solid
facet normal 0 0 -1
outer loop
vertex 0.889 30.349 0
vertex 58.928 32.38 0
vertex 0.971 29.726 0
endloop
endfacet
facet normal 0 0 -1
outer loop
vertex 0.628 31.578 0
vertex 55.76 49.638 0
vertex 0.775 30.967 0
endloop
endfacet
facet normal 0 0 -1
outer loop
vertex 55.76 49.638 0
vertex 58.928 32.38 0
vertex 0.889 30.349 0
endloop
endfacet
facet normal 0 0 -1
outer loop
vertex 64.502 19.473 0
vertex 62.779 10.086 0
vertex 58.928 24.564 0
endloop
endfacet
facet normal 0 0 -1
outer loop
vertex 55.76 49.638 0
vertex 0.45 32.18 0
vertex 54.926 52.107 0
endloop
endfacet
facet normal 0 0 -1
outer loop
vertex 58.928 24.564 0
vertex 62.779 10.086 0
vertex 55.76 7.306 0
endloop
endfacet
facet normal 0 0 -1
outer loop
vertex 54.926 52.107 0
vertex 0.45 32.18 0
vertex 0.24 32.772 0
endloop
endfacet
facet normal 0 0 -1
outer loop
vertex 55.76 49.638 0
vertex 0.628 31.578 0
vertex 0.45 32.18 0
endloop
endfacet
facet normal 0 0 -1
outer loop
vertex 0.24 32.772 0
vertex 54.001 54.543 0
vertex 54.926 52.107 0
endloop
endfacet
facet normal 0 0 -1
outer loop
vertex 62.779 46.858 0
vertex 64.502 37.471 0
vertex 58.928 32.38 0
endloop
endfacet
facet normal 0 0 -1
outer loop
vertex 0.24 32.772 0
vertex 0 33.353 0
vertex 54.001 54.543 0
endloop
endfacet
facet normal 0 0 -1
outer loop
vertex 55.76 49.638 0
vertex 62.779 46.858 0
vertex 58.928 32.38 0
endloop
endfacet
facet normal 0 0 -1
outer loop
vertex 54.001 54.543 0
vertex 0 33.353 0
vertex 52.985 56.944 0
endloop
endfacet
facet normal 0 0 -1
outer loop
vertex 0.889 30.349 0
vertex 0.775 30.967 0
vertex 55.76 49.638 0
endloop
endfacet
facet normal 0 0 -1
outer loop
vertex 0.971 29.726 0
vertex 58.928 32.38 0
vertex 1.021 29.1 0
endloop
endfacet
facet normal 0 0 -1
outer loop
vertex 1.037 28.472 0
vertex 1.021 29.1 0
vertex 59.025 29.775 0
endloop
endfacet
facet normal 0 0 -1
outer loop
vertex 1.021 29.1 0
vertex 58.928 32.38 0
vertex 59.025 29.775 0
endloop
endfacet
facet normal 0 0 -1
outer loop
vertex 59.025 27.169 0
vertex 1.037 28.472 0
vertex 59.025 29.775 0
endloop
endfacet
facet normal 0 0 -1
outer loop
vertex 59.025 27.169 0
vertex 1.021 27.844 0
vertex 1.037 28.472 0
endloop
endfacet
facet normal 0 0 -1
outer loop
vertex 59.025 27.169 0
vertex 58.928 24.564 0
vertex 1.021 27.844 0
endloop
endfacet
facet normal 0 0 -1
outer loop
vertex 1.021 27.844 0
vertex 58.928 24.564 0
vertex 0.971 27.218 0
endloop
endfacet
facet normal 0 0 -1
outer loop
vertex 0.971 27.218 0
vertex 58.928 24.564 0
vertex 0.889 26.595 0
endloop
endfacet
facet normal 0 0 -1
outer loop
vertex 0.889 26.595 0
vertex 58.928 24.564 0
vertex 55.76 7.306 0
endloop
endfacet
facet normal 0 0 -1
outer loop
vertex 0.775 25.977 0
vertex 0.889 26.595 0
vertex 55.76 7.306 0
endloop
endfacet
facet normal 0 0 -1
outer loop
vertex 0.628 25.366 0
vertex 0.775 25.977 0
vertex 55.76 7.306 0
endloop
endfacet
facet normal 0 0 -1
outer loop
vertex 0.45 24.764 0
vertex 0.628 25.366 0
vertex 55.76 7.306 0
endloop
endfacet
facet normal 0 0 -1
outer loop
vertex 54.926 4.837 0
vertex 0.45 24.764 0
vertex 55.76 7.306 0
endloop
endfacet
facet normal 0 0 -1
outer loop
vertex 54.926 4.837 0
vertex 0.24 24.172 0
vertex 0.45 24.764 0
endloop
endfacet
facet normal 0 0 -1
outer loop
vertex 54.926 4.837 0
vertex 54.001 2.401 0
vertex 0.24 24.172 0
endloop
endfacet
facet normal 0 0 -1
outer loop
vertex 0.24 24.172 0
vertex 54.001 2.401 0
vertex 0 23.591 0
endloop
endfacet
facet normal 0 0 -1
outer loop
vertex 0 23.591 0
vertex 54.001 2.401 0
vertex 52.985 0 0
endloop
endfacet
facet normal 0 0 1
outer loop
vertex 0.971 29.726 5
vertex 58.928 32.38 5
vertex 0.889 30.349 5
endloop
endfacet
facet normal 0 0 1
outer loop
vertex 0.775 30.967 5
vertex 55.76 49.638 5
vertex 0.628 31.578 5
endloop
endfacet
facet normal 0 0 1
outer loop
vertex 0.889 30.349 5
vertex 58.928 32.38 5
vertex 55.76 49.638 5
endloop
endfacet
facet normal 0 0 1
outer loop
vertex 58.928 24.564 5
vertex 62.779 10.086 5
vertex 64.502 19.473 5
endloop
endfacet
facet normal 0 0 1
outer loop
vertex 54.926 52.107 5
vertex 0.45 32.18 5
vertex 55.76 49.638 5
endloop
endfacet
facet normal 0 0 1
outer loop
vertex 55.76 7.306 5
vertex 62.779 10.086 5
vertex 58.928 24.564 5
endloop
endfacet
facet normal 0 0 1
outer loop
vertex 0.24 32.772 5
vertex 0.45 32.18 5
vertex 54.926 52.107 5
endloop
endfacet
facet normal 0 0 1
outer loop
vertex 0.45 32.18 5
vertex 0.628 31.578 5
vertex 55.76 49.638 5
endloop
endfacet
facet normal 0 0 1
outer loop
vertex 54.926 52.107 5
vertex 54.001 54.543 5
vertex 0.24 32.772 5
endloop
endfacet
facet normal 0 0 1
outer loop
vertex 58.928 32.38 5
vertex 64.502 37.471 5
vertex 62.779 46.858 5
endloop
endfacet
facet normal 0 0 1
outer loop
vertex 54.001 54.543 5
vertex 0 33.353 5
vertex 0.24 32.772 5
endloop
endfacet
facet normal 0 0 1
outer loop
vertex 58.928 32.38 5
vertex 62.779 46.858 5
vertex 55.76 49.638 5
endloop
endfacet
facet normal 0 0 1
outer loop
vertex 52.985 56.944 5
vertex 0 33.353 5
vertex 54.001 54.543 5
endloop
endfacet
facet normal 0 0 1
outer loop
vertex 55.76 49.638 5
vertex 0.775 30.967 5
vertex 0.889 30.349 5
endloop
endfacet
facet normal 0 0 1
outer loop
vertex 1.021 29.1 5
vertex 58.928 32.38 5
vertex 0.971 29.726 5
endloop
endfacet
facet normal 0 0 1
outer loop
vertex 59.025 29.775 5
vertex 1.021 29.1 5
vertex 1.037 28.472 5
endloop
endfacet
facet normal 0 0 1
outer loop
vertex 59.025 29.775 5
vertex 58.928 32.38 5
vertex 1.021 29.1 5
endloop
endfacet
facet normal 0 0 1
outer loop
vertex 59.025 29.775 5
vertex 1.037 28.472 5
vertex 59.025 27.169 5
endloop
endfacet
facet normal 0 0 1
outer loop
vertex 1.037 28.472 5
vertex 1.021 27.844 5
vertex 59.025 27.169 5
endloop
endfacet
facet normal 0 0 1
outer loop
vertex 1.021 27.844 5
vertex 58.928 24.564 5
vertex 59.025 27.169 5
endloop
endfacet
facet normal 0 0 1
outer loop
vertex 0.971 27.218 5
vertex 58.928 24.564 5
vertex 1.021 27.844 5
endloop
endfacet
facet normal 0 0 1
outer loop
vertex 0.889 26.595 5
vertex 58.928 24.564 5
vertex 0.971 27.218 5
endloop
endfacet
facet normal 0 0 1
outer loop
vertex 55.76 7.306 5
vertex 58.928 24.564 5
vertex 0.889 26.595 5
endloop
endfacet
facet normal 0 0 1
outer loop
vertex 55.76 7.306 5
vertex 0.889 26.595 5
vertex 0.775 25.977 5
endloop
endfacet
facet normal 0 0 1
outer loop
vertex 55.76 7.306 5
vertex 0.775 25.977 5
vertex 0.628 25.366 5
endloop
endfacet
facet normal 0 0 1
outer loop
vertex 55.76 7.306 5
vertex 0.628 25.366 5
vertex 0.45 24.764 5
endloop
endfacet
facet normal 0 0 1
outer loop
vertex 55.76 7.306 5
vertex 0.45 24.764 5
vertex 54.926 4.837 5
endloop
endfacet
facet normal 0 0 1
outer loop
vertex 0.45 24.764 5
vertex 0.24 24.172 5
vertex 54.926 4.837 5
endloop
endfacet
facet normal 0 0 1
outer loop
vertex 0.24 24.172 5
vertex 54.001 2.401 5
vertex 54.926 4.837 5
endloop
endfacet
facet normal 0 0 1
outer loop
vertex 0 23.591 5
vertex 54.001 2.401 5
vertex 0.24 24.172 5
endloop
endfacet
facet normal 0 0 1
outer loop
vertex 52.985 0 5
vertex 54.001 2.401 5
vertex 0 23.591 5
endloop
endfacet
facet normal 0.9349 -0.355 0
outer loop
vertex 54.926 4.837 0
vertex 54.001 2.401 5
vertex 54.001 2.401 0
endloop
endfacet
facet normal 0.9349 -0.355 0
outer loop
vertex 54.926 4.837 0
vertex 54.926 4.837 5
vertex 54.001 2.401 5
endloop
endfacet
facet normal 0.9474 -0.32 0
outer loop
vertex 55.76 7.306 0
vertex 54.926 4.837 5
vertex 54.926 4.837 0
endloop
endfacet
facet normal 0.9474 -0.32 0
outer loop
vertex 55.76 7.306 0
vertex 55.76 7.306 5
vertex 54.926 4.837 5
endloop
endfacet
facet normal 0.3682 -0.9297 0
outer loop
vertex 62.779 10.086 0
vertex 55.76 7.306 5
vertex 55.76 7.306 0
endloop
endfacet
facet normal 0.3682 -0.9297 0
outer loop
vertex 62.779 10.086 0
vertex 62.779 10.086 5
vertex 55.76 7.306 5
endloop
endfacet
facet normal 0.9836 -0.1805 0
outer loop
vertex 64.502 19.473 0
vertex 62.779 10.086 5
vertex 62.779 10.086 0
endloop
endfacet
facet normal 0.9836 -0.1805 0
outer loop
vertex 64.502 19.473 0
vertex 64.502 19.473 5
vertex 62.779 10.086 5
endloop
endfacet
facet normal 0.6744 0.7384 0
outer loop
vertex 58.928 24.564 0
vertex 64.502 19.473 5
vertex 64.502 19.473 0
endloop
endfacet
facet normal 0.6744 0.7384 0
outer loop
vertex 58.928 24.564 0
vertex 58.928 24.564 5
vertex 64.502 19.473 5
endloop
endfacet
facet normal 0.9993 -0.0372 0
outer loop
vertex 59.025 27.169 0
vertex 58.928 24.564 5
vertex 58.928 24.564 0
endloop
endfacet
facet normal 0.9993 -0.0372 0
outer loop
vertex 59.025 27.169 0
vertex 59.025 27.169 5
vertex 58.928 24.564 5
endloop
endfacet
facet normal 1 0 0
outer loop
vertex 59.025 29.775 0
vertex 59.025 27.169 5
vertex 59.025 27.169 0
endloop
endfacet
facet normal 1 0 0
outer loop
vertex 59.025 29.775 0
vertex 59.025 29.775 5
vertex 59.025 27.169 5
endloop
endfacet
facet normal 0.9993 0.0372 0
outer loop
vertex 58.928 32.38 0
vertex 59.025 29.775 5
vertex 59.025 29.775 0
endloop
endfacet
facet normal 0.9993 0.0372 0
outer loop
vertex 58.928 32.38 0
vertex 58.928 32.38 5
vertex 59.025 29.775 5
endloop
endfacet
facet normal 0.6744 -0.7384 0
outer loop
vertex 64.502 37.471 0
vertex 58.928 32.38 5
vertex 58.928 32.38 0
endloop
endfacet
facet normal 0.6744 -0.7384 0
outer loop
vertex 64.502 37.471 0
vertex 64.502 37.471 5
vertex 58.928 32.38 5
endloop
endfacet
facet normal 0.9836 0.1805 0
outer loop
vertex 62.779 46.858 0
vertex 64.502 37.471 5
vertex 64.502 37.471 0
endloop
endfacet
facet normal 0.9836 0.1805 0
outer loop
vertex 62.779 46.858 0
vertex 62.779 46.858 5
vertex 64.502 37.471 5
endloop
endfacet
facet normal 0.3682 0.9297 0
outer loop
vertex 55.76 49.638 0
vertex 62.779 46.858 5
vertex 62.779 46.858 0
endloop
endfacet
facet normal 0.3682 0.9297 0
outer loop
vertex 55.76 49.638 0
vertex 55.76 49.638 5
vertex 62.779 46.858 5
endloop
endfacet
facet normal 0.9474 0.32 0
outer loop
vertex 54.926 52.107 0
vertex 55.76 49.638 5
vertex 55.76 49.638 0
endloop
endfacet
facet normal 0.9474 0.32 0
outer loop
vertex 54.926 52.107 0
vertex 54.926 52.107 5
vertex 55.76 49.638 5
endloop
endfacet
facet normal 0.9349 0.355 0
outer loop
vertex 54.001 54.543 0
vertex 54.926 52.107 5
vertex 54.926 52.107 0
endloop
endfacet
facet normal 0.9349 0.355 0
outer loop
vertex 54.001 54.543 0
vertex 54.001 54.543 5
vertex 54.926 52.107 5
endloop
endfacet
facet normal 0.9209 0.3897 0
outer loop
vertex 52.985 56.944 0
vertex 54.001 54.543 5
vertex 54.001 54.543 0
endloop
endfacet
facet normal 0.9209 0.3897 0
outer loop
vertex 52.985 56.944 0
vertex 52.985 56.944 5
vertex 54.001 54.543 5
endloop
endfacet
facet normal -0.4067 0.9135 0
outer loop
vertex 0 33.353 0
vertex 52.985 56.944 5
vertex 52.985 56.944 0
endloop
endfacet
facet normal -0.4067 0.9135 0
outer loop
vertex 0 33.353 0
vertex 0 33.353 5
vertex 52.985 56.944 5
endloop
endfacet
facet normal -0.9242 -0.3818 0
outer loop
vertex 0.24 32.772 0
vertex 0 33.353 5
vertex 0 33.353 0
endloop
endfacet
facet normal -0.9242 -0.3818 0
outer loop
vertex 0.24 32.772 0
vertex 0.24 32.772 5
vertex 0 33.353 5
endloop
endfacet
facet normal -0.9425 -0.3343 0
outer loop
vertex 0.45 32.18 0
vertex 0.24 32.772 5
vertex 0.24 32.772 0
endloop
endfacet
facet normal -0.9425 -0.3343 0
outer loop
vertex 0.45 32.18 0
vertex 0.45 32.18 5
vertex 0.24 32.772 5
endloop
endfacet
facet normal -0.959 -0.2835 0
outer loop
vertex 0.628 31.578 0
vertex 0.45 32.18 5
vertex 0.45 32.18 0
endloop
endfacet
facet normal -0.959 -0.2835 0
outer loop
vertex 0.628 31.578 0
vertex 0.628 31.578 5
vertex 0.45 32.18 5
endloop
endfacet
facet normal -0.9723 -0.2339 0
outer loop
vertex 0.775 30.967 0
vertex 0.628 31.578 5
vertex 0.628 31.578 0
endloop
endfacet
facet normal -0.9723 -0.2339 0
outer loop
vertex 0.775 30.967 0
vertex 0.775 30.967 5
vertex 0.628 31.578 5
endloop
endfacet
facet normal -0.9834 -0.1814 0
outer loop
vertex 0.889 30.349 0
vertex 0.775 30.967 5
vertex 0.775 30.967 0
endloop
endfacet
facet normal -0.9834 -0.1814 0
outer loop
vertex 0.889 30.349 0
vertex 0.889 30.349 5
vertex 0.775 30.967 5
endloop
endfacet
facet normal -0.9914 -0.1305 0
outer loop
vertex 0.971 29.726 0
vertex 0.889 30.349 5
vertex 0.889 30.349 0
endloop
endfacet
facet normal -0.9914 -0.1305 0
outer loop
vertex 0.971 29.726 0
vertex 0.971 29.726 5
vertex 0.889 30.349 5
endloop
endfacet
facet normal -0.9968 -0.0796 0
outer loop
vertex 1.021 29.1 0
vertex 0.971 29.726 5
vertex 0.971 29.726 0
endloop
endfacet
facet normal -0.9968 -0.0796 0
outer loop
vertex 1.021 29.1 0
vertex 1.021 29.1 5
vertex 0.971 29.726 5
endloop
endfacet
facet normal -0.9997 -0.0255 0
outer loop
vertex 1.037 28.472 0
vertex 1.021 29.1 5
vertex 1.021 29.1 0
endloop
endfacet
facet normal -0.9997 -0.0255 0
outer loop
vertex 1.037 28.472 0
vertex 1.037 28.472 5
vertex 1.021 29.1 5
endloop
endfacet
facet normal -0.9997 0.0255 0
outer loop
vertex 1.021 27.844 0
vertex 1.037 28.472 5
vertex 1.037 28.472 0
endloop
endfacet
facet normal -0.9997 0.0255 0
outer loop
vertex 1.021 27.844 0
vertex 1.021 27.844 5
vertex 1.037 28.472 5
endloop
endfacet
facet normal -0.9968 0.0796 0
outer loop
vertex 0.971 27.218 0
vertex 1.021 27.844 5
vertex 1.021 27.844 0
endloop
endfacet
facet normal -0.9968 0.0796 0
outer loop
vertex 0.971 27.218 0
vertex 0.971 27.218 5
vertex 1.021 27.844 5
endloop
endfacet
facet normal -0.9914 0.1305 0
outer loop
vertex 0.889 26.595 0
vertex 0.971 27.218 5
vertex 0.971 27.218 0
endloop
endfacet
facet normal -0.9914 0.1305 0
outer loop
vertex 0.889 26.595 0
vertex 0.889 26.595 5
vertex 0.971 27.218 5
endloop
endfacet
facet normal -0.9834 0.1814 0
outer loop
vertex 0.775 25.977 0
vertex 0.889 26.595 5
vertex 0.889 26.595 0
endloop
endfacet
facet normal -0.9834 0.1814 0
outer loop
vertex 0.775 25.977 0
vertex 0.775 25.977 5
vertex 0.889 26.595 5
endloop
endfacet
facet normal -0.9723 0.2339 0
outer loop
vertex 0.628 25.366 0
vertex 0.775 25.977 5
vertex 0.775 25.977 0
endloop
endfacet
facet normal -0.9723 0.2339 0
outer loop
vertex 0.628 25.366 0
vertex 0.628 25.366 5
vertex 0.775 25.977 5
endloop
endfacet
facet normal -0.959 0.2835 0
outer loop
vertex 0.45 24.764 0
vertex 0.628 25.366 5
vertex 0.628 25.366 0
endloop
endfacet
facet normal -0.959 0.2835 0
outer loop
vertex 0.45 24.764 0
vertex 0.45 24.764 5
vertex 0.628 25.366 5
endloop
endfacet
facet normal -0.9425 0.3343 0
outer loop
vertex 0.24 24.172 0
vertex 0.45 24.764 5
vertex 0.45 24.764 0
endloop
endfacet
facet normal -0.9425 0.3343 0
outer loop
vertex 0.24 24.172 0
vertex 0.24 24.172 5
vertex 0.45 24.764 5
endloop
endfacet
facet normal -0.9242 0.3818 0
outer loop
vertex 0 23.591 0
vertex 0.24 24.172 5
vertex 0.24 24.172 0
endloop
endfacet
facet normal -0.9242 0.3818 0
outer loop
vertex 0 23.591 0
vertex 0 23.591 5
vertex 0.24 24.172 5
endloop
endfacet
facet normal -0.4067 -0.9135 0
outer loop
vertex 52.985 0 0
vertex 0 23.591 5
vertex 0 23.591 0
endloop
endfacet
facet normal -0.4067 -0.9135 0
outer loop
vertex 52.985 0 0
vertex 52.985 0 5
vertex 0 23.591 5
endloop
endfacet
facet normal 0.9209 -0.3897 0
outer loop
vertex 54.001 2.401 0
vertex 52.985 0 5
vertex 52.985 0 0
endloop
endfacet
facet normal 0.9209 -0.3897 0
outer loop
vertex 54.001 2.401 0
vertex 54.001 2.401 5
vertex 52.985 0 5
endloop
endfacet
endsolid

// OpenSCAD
$fn = 32;

// ----------------------------------------------------------------------
// Gear sector: 2 teeth on 48 degrees
// ----------------------------------------------------------------------

// --- parameters (mm) ---
sector_angle = 48;        // sector angle, degrees
root_r = 70;              // root circle radius
tooth_h = 6;              // tooth height over the root circle
teeth = 2;                // number of teeth on the sector
hub_r = 12;               // hub bore radius
plate_t = 5;              // sector thickness, Z
arc_step = 3;             // sampling step of the root/hub arcs, degrees

tip_r = root_r + tooth_h;  // tip circle radius

profile = [[52.985, 0], [54.001, 2.401], [54.926, 4.837], [55.76, 7.306], [62.779, 10.086], [64.502, 19.473], [58.928, 24.564], [59.025, 27.169], [59.025, 29.775], [58.928, 32.38], [64.502, 37.471], [62.779, 46.858], [55.76, 49.638], [54.926, 52.107], [54.001, 54.543], [52.985, 56.944], [0, 33.353], [0.24, 32.772], [0.45, 32.18], [0.628, 31.578], [0.775, 30.967], [0.889, 30.349], [0.971, 29.726], [1.021, 29.1], [1.037, 28.472], [1.021, 27.844], [0.971, 27.218], [0.889, 26.595], [0.775, 25.977], [0.628, 25.366], [0.45, 24.764], [0.24, 24.172], [0, 23.591]];  // primary outline, 33 points, counter clockwise

// --- the one profile operation ---
linear_extrude(height = plate_t) polygon(points = profile);
